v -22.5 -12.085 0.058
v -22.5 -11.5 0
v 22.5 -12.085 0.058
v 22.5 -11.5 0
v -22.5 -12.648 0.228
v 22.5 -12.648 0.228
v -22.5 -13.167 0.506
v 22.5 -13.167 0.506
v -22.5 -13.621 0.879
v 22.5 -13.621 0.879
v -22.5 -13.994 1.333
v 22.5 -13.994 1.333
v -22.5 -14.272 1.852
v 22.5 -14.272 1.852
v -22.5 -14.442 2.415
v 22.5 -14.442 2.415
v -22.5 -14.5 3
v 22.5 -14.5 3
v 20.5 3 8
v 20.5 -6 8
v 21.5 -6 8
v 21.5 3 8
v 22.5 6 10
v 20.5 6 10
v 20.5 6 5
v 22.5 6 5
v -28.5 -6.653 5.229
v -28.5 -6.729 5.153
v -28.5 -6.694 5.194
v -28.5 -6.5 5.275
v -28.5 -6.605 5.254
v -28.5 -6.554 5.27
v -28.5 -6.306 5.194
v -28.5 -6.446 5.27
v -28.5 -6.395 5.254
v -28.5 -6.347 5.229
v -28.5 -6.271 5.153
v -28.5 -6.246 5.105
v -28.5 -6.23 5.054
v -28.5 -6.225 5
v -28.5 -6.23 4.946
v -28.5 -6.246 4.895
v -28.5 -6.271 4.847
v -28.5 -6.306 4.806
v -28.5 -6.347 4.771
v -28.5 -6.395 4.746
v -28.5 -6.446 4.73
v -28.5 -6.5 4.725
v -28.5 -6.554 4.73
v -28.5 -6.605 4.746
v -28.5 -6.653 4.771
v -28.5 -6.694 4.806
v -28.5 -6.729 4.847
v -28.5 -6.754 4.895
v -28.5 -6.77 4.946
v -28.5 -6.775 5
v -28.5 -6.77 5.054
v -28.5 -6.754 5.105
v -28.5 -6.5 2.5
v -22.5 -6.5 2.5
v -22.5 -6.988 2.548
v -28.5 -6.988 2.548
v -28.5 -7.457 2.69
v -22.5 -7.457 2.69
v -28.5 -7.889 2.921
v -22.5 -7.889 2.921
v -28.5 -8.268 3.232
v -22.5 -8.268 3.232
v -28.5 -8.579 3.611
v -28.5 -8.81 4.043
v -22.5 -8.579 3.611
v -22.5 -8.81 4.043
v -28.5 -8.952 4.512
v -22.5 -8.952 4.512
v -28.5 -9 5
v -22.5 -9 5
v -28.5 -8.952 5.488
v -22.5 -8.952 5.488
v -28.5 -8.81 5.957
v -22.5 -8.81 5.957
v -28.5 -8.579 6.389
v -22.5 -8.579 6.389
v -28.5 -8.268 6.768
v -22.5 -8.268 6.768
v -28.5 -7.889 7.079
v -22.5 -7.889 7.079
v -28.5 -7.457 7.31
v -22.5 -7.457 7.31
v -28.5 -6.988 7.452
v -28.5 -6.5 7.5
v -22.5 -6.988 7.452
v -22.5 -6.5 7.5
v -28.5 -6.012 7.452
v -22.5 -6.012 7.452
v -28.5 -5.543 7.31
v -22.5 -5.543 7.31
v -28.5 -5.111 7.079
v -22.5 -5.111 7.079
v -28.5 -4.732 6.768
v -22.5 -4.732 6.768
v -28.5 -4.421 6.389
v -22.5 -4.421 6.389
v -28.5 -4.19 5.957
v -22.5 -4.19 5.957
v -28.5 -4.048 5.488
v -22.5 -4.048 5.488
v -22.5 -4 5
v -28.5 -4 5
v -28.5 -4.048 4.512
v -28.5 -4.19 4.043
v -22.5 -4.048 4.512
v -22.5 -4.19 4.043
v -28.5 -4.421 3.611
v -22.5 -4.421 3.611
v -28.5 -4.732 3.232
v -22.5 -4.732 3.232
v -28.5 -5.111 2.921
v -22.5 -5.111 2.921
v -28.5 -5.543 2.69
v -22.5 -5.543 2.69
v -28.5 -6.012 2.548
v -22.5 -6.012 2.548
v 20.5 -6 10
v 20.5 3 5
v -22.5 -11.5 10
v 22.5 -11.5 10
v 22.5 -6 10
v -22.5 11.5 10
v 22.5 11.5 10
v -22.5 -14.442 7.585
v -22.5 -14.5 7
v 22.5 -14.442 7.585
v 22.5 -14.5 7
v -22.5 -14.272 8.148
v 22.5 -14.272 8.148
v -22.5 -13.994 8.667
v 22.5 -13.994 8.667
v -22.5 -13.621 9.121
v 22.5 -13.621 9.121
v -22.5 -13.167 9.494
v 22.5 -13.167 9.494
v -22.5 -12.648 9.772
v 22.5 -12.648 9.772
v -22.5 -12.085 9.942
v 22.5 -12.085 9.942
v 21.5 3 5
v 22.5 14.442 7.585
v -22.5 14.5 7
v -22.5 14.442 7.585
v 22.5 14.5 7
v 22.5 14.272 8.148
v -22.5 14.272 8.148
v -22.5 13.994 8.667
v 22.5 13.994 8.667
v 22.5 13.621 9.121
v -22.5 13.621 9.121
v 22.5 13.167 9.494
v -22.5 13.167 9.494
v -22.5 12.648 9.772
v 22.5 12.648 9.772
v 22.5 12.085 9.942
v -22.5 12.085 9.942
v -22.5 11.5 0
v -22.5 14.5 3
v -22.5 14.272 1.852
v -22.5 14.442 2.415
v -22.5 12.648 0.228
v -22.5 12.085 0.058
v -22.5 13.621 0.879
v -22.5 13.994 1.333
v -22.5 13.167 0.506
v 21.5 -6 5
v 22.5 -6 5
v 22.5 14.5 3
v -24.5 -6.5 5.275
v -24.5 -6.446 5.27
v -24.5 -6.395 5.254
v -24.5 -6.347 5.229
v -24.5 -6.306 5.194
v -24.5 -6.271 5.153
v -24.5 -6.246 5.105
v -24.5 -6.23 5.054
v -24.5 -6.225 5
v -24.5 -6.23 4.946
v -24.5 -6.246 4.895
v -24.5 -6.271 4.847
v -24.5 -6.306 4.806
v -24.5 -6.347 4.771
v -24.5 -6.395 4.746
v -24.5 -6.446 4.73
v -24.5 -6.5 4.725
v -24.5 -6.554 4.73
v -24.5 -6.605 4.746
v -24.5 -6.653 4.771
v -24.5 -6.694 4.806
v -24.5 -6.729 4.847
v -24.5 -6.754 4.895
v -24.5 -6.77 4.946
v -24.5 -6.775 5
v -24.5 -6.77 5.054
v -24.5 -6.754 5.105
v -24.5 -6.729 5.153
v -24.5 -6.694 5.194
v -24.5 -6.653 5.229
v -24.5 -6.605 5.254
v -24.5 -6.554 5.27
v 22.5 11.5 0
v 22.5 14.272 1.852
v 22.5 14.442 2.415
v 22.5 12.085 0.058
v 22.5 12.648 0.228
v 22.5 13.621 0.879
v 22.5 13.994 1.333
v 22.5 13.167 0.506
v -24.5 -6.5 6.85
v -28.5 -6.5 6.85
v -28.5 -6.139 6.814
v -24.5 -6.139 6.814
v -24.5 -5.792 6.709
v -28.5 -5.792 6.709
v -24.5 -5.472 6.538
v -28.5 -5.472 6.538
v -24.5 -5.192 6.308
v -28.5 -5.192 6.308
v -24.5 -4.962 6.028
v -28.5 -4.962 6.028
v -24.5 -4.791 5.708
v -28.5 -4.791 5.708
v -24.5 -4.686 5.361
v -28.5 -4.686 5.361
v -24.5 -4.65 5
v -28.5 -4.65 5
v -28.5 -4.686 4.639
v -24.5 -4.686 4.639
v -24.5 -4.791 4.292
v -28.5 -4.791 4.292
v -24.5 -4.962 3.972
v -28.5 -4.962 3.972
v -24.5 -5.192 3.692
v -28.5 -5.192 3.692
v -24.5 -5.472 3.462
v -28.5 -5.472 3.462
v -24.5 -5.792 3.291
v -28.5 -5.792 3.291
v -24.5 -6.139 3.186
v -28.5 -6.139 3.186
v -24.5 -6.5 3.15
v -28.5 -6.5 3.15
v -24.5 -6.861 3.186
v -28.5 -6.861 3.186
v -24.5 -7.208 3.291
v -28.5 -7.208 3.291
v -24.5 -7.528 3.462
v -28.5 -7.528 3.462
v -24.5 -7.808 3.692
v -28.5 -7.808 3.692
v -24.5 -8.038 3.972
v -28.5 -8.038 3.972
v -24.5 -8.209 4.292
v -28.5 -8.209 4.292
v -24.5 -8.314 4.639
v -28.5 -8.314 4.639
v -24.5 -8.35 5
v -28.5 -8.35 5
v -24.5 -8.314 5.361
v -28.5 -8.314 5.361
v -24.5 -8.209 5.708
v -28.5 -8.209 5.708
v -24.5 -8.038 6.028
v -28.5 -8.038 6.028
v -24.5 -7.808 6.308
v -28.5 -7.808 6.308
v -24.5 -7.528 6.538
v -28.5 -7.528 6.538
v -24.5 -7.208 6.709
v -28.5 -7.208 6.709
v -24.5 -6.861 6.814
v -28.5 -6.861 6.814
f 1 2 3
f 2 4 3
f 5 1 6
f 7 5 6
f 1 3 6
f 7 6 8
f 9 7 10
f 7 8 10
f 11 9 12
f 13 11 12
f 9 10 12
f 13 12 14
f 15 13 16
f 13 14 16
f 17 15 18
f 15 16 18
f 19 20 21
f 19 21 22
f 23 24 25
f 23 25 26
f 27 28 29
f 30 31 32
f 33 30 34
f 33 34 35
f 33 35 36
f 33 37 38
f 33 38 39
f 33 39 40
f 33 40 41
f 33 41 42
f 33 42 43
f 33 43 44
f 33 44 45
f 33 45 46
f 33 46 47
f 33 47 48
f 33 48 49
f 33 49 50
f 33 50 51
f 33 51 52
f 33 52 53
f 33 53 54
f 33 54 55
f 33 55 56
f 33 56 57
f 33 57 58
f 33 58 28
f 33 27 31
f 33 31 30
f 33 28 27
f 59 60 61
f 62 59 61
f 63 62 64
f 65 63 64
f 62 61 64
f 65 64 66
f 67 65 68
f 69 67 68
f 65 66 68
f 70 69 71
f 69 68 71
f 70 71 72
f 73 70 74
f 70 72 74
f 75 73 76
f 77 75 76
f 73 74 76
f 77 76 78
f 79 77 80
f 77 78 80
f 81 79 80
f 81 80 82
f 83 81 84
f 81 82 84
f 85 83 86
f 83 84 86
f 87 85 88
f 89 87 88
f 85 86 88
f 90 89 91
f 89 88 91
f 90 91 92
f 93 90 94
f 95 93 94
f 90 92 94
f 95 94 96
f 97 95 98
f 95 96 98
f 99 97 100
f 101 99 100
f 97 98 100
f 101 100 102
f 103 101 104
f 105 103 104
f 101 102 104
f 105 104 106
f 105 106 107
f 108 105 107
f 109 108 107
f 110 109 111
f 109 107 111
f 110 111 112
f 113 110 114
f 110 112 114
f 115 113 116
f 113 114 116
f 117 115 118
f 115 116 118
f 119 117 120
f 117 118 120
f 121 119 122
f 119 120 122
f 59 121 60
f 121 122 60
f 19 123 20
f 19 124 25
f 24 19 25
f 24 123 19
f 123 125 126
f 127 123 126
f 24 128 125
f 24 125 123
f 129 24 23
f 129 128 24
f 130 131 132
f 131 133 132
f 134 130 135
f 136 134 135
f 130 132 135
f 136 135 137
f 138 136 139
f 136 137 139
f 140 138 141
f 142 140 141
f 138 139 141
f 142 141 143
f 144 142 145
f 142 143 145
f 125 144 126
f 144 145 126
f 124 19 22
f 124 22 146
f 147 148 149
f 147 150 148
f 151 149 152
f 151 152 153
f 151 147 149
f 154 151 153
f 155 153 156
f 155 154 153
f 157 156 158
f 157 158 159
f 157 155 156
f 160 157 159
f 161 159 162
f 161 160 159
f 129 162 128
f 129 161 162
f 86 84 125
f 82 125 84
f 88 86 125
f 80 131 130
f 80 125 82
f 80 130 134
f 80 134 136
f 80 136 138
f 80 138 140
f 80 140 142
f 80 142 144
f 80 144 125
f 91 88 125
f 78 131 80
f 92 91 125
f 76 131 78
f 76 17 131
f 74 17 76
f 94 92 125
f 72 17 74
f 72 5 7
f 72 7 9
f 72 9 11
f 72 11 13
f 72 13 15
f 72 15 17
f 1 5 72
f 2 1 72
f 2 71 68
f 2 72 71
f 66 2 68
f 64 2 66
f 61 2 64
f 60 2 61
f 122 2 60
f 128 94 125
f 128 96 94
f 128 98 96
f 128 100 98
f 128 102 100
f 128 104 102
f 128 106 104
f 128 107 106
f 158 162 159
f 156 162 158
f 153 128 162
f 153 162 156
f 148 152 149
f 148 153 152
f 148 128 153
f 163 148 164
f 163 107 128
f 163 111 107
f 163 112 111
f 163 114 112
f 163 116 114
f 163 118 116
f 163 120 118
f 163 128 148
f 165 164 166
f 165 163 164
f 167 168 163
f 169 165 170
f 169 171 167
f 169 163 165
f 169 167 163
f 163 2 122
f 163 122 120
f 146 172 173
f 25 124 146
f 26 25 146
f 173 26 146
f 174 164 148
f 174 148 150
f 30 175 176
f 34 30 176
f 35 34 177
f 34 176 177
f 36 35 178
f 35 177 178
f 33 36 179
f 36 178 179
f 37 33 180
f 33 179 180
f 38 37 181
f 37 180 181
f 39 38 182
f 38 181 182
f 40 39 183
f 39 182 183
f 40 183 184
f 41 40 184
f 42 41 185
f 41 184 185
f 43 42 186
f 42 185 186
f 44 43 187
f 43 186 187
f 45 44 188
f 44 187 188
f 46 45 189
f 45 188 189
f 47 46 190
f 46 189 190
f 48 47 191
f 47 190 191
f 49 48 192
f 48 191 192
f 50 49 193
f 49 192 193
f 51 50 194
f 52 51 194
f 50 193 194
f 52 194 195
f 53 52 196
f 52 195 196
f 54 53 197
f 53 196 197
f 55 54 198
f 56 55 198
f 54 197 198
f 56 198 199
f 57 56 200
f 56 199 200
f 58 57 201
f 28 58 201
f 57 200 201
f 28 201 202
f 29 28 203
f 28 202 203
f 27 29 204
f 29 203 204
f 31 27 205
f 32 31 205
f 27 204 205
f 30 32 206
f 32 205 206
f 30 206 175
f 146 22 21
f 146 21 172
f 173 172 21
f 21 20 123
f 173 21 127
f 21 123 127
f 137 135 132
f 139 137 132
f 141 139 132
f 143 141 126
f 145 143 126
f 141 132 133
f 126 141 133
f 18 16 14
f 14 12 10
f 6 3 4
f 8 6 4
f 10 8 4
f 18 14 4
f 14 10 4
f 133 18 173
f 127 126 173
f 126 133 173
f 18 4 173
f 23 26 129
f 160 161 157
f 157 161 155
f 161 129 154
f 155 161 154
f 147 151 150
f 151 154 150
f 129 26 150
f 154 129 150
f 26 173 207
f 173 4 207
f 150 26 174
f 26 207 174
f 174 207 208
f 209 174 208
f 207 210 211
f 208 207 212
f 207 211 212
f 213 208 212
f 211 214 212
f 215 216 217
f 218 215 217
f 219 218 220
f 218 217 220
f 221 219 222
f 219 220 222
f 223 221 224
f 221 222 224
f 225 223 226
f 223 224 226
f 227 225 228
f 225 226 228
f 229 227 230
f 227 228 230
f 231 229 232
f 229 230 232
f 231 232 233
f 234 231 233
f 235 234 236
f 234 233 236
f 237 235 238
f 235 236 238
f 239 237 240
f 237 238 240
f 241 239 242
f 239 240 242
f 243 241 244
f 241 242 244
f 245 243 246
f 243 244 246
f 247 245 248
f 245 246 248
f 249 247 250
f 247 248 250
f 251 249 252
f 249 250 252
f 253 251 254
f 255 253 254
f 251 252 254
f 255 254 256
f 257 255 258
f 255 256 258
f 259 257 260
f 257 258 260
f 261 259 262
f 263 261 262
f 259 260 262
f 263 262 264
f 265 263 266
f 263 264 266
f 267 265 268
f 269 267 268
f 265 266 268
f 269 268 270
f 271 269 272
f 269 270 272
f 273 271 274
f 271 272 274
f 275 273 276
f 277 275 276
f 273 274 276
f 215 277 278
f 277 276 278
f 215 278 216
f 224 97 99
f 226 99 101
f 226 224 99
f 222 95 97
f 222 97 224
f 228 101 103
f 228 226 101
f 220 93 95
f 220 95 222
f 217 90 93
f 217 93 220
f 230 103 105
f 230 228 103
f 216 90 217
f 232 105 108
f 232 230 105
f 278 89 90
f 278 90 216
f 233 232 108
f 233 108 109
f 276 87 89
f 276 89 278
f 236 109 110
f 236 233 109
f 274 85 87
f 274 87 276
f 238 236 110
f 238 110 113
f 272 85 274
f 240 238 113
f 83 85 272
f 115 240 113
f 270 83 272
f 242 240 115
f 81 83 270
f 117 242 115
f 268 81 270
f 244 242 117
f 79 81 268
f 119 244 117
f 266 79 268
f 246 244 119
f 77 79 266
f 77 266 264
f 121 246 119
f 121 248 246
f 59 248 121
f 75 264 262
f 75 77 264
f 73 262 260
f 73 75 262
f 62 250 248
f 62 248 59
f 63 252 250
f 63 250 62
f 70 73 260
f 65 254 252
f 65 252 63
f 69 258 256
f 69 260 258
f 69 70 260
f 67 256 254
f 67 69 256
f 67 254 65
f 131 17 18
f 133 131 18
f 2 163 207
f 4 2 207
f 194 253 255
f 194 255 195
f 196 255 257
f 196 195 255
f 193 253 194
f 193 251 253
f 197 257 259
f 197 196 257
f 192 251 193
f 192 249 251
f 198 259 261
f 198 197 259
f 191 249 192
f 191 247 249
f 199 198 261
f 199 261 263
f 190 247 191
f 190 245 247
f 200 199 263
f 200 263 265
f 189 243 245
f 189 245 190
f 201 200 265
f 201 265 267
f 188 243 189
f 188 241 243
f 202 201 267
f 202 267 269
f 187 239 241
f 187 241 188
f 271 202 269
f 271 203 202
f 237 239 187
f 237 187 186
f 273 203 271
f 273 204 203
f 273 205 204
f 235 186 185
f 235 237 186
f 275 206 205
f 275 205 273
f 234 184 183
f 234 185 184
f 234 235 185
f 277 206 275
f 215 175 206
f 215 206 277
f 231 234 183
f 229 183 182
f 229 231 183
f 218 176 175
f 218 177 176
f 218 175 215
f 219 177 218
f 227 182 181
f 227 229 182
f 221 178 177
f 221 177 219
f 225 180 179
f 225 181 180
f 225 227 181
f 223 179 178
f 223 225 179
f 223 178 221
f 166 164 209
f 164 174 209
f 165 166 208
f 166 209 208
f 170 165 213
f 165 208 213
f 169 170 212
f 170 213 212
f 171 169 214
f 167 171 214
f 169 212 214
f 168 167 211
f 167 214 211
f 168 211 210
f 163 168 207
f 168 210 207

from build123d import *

# Parameters (mm, degrees)
SKETCH1_W           = 45
SKETCH1_H           = 29
BOSS_EXTRUDE1_DEPTH = 10
SKETCH2_W           = 2
SKETCH2_H           = 12
CUT_EXTRUDE1_DEPTH  = 5
SKETCH3_W           = 3
SKETCH3_H           = 9
BOSS_EXTRUDE2_DEPTH = 1
SKETCH4_R           = 2.5
BOSS_EXTRUDE3_DEPTH = 6
SKETCH5_R           = 1.85
CUT_EXTRUDE2_DEPTH  = 4
SKETCH6_R           = 0.275
BOSS_EXTRUDE4_DEPTH = 4
FILLET2_R           = 3
FILLET3_R           = 3
FILLET4_R           = 3
FILLET5_R           = 3


with BuildPart() as part:
    # Sketch1 → Boss-Extrude1 (new body)
    with BuildSketch(Plane.XY):
        Rectangle(SKETCH1_W, SKETCH1_H)
    extrude(amount=BOSS_EXTRUDE1_DEPTH)

    # Sketch2 → Cut-Extrude1 (cut)
    with BuildSketch(Plane.XY.offset(10)):
        with Locations((21.5, 0)):
            Rectangle(SKETCH2_W, SKETCH2_H)
    extrude(amount=-CUT_EXTRUDE1_DEPTH, mode=Mode.SUBTRACT)

    # Sketch3 → Boss-Extrude2 (add)
    with BuildSketch(Plane(origin=(20.5, 0, 0), x_dir=(0, 0, -1), z_dir=(1, 0, 0))):
        with Locations((-6.5, -1.5)):
            Rectangle(SKETCH3_W, SKETCH3_H)
    extrude(amount=BOSS_EXTRUDE2_DEPTH)

    # Sketch4 → Boss-Extrude3 (add)
    with BuildSketch(Plane.ZY.offset(22.5)):
        with Locations(Location((5, -6.5, 0), (0, 0, 180))):
            Circle(SKETCH4_R)
    extrude(amount=BOSS_EXTRUDE3_DEPTH)

    # Sketch5 → Cut-Extrude2 (cut)
    with BuildSketch(Plane.ZY.offset(28.5)):
        with Locations((5, -6.5)):
            Circle(SKETCH5_R)
    extrude(amount=-CUT_EXTRUDE2_DEPTH, mode=Mode.SUBTRACT)

    # Sketch6 → Boss-Extrude4 (add)
    with BuildSketch(Plane.ZY.offset(24.5)):
        with Locations((5, -6.5)):
            Circle(SKETCH6_R)
    extrude(amount=BOSS_EXTRUDE4_DEPTH)

    # Fillet2
    fillet2_edges = [part.edges().sort_by_distance(p)[0] for p in [
        (0, 14.5, 0),
    ]]
    fillet(fillet2_edges, radius=FILLET2_R)

    # Fillet3
    fillet3_edges = [part.edges().sort_by_distance(p)[0] for p in [
        (0, 14.5, 10),
    ]]
    fillet(fillet3_edges, radius=FILLET3_R)

    # Fillet4
    fillet4_edges = [part.edges().sort_by_distance(p)[0] for p in [
        (0, -14.5, 0),
    ]]
    fillet(fillet4_edges, radius=FILLET4_R)

    # Fillet5
    fillet5_edges = [part.edges().sort_by_distance(p)[0] for p in [
        (0, -14.5, 10),
    ]]
    fillet(fillet5_edges, radius=FILLET5_R)


solid = part.part
